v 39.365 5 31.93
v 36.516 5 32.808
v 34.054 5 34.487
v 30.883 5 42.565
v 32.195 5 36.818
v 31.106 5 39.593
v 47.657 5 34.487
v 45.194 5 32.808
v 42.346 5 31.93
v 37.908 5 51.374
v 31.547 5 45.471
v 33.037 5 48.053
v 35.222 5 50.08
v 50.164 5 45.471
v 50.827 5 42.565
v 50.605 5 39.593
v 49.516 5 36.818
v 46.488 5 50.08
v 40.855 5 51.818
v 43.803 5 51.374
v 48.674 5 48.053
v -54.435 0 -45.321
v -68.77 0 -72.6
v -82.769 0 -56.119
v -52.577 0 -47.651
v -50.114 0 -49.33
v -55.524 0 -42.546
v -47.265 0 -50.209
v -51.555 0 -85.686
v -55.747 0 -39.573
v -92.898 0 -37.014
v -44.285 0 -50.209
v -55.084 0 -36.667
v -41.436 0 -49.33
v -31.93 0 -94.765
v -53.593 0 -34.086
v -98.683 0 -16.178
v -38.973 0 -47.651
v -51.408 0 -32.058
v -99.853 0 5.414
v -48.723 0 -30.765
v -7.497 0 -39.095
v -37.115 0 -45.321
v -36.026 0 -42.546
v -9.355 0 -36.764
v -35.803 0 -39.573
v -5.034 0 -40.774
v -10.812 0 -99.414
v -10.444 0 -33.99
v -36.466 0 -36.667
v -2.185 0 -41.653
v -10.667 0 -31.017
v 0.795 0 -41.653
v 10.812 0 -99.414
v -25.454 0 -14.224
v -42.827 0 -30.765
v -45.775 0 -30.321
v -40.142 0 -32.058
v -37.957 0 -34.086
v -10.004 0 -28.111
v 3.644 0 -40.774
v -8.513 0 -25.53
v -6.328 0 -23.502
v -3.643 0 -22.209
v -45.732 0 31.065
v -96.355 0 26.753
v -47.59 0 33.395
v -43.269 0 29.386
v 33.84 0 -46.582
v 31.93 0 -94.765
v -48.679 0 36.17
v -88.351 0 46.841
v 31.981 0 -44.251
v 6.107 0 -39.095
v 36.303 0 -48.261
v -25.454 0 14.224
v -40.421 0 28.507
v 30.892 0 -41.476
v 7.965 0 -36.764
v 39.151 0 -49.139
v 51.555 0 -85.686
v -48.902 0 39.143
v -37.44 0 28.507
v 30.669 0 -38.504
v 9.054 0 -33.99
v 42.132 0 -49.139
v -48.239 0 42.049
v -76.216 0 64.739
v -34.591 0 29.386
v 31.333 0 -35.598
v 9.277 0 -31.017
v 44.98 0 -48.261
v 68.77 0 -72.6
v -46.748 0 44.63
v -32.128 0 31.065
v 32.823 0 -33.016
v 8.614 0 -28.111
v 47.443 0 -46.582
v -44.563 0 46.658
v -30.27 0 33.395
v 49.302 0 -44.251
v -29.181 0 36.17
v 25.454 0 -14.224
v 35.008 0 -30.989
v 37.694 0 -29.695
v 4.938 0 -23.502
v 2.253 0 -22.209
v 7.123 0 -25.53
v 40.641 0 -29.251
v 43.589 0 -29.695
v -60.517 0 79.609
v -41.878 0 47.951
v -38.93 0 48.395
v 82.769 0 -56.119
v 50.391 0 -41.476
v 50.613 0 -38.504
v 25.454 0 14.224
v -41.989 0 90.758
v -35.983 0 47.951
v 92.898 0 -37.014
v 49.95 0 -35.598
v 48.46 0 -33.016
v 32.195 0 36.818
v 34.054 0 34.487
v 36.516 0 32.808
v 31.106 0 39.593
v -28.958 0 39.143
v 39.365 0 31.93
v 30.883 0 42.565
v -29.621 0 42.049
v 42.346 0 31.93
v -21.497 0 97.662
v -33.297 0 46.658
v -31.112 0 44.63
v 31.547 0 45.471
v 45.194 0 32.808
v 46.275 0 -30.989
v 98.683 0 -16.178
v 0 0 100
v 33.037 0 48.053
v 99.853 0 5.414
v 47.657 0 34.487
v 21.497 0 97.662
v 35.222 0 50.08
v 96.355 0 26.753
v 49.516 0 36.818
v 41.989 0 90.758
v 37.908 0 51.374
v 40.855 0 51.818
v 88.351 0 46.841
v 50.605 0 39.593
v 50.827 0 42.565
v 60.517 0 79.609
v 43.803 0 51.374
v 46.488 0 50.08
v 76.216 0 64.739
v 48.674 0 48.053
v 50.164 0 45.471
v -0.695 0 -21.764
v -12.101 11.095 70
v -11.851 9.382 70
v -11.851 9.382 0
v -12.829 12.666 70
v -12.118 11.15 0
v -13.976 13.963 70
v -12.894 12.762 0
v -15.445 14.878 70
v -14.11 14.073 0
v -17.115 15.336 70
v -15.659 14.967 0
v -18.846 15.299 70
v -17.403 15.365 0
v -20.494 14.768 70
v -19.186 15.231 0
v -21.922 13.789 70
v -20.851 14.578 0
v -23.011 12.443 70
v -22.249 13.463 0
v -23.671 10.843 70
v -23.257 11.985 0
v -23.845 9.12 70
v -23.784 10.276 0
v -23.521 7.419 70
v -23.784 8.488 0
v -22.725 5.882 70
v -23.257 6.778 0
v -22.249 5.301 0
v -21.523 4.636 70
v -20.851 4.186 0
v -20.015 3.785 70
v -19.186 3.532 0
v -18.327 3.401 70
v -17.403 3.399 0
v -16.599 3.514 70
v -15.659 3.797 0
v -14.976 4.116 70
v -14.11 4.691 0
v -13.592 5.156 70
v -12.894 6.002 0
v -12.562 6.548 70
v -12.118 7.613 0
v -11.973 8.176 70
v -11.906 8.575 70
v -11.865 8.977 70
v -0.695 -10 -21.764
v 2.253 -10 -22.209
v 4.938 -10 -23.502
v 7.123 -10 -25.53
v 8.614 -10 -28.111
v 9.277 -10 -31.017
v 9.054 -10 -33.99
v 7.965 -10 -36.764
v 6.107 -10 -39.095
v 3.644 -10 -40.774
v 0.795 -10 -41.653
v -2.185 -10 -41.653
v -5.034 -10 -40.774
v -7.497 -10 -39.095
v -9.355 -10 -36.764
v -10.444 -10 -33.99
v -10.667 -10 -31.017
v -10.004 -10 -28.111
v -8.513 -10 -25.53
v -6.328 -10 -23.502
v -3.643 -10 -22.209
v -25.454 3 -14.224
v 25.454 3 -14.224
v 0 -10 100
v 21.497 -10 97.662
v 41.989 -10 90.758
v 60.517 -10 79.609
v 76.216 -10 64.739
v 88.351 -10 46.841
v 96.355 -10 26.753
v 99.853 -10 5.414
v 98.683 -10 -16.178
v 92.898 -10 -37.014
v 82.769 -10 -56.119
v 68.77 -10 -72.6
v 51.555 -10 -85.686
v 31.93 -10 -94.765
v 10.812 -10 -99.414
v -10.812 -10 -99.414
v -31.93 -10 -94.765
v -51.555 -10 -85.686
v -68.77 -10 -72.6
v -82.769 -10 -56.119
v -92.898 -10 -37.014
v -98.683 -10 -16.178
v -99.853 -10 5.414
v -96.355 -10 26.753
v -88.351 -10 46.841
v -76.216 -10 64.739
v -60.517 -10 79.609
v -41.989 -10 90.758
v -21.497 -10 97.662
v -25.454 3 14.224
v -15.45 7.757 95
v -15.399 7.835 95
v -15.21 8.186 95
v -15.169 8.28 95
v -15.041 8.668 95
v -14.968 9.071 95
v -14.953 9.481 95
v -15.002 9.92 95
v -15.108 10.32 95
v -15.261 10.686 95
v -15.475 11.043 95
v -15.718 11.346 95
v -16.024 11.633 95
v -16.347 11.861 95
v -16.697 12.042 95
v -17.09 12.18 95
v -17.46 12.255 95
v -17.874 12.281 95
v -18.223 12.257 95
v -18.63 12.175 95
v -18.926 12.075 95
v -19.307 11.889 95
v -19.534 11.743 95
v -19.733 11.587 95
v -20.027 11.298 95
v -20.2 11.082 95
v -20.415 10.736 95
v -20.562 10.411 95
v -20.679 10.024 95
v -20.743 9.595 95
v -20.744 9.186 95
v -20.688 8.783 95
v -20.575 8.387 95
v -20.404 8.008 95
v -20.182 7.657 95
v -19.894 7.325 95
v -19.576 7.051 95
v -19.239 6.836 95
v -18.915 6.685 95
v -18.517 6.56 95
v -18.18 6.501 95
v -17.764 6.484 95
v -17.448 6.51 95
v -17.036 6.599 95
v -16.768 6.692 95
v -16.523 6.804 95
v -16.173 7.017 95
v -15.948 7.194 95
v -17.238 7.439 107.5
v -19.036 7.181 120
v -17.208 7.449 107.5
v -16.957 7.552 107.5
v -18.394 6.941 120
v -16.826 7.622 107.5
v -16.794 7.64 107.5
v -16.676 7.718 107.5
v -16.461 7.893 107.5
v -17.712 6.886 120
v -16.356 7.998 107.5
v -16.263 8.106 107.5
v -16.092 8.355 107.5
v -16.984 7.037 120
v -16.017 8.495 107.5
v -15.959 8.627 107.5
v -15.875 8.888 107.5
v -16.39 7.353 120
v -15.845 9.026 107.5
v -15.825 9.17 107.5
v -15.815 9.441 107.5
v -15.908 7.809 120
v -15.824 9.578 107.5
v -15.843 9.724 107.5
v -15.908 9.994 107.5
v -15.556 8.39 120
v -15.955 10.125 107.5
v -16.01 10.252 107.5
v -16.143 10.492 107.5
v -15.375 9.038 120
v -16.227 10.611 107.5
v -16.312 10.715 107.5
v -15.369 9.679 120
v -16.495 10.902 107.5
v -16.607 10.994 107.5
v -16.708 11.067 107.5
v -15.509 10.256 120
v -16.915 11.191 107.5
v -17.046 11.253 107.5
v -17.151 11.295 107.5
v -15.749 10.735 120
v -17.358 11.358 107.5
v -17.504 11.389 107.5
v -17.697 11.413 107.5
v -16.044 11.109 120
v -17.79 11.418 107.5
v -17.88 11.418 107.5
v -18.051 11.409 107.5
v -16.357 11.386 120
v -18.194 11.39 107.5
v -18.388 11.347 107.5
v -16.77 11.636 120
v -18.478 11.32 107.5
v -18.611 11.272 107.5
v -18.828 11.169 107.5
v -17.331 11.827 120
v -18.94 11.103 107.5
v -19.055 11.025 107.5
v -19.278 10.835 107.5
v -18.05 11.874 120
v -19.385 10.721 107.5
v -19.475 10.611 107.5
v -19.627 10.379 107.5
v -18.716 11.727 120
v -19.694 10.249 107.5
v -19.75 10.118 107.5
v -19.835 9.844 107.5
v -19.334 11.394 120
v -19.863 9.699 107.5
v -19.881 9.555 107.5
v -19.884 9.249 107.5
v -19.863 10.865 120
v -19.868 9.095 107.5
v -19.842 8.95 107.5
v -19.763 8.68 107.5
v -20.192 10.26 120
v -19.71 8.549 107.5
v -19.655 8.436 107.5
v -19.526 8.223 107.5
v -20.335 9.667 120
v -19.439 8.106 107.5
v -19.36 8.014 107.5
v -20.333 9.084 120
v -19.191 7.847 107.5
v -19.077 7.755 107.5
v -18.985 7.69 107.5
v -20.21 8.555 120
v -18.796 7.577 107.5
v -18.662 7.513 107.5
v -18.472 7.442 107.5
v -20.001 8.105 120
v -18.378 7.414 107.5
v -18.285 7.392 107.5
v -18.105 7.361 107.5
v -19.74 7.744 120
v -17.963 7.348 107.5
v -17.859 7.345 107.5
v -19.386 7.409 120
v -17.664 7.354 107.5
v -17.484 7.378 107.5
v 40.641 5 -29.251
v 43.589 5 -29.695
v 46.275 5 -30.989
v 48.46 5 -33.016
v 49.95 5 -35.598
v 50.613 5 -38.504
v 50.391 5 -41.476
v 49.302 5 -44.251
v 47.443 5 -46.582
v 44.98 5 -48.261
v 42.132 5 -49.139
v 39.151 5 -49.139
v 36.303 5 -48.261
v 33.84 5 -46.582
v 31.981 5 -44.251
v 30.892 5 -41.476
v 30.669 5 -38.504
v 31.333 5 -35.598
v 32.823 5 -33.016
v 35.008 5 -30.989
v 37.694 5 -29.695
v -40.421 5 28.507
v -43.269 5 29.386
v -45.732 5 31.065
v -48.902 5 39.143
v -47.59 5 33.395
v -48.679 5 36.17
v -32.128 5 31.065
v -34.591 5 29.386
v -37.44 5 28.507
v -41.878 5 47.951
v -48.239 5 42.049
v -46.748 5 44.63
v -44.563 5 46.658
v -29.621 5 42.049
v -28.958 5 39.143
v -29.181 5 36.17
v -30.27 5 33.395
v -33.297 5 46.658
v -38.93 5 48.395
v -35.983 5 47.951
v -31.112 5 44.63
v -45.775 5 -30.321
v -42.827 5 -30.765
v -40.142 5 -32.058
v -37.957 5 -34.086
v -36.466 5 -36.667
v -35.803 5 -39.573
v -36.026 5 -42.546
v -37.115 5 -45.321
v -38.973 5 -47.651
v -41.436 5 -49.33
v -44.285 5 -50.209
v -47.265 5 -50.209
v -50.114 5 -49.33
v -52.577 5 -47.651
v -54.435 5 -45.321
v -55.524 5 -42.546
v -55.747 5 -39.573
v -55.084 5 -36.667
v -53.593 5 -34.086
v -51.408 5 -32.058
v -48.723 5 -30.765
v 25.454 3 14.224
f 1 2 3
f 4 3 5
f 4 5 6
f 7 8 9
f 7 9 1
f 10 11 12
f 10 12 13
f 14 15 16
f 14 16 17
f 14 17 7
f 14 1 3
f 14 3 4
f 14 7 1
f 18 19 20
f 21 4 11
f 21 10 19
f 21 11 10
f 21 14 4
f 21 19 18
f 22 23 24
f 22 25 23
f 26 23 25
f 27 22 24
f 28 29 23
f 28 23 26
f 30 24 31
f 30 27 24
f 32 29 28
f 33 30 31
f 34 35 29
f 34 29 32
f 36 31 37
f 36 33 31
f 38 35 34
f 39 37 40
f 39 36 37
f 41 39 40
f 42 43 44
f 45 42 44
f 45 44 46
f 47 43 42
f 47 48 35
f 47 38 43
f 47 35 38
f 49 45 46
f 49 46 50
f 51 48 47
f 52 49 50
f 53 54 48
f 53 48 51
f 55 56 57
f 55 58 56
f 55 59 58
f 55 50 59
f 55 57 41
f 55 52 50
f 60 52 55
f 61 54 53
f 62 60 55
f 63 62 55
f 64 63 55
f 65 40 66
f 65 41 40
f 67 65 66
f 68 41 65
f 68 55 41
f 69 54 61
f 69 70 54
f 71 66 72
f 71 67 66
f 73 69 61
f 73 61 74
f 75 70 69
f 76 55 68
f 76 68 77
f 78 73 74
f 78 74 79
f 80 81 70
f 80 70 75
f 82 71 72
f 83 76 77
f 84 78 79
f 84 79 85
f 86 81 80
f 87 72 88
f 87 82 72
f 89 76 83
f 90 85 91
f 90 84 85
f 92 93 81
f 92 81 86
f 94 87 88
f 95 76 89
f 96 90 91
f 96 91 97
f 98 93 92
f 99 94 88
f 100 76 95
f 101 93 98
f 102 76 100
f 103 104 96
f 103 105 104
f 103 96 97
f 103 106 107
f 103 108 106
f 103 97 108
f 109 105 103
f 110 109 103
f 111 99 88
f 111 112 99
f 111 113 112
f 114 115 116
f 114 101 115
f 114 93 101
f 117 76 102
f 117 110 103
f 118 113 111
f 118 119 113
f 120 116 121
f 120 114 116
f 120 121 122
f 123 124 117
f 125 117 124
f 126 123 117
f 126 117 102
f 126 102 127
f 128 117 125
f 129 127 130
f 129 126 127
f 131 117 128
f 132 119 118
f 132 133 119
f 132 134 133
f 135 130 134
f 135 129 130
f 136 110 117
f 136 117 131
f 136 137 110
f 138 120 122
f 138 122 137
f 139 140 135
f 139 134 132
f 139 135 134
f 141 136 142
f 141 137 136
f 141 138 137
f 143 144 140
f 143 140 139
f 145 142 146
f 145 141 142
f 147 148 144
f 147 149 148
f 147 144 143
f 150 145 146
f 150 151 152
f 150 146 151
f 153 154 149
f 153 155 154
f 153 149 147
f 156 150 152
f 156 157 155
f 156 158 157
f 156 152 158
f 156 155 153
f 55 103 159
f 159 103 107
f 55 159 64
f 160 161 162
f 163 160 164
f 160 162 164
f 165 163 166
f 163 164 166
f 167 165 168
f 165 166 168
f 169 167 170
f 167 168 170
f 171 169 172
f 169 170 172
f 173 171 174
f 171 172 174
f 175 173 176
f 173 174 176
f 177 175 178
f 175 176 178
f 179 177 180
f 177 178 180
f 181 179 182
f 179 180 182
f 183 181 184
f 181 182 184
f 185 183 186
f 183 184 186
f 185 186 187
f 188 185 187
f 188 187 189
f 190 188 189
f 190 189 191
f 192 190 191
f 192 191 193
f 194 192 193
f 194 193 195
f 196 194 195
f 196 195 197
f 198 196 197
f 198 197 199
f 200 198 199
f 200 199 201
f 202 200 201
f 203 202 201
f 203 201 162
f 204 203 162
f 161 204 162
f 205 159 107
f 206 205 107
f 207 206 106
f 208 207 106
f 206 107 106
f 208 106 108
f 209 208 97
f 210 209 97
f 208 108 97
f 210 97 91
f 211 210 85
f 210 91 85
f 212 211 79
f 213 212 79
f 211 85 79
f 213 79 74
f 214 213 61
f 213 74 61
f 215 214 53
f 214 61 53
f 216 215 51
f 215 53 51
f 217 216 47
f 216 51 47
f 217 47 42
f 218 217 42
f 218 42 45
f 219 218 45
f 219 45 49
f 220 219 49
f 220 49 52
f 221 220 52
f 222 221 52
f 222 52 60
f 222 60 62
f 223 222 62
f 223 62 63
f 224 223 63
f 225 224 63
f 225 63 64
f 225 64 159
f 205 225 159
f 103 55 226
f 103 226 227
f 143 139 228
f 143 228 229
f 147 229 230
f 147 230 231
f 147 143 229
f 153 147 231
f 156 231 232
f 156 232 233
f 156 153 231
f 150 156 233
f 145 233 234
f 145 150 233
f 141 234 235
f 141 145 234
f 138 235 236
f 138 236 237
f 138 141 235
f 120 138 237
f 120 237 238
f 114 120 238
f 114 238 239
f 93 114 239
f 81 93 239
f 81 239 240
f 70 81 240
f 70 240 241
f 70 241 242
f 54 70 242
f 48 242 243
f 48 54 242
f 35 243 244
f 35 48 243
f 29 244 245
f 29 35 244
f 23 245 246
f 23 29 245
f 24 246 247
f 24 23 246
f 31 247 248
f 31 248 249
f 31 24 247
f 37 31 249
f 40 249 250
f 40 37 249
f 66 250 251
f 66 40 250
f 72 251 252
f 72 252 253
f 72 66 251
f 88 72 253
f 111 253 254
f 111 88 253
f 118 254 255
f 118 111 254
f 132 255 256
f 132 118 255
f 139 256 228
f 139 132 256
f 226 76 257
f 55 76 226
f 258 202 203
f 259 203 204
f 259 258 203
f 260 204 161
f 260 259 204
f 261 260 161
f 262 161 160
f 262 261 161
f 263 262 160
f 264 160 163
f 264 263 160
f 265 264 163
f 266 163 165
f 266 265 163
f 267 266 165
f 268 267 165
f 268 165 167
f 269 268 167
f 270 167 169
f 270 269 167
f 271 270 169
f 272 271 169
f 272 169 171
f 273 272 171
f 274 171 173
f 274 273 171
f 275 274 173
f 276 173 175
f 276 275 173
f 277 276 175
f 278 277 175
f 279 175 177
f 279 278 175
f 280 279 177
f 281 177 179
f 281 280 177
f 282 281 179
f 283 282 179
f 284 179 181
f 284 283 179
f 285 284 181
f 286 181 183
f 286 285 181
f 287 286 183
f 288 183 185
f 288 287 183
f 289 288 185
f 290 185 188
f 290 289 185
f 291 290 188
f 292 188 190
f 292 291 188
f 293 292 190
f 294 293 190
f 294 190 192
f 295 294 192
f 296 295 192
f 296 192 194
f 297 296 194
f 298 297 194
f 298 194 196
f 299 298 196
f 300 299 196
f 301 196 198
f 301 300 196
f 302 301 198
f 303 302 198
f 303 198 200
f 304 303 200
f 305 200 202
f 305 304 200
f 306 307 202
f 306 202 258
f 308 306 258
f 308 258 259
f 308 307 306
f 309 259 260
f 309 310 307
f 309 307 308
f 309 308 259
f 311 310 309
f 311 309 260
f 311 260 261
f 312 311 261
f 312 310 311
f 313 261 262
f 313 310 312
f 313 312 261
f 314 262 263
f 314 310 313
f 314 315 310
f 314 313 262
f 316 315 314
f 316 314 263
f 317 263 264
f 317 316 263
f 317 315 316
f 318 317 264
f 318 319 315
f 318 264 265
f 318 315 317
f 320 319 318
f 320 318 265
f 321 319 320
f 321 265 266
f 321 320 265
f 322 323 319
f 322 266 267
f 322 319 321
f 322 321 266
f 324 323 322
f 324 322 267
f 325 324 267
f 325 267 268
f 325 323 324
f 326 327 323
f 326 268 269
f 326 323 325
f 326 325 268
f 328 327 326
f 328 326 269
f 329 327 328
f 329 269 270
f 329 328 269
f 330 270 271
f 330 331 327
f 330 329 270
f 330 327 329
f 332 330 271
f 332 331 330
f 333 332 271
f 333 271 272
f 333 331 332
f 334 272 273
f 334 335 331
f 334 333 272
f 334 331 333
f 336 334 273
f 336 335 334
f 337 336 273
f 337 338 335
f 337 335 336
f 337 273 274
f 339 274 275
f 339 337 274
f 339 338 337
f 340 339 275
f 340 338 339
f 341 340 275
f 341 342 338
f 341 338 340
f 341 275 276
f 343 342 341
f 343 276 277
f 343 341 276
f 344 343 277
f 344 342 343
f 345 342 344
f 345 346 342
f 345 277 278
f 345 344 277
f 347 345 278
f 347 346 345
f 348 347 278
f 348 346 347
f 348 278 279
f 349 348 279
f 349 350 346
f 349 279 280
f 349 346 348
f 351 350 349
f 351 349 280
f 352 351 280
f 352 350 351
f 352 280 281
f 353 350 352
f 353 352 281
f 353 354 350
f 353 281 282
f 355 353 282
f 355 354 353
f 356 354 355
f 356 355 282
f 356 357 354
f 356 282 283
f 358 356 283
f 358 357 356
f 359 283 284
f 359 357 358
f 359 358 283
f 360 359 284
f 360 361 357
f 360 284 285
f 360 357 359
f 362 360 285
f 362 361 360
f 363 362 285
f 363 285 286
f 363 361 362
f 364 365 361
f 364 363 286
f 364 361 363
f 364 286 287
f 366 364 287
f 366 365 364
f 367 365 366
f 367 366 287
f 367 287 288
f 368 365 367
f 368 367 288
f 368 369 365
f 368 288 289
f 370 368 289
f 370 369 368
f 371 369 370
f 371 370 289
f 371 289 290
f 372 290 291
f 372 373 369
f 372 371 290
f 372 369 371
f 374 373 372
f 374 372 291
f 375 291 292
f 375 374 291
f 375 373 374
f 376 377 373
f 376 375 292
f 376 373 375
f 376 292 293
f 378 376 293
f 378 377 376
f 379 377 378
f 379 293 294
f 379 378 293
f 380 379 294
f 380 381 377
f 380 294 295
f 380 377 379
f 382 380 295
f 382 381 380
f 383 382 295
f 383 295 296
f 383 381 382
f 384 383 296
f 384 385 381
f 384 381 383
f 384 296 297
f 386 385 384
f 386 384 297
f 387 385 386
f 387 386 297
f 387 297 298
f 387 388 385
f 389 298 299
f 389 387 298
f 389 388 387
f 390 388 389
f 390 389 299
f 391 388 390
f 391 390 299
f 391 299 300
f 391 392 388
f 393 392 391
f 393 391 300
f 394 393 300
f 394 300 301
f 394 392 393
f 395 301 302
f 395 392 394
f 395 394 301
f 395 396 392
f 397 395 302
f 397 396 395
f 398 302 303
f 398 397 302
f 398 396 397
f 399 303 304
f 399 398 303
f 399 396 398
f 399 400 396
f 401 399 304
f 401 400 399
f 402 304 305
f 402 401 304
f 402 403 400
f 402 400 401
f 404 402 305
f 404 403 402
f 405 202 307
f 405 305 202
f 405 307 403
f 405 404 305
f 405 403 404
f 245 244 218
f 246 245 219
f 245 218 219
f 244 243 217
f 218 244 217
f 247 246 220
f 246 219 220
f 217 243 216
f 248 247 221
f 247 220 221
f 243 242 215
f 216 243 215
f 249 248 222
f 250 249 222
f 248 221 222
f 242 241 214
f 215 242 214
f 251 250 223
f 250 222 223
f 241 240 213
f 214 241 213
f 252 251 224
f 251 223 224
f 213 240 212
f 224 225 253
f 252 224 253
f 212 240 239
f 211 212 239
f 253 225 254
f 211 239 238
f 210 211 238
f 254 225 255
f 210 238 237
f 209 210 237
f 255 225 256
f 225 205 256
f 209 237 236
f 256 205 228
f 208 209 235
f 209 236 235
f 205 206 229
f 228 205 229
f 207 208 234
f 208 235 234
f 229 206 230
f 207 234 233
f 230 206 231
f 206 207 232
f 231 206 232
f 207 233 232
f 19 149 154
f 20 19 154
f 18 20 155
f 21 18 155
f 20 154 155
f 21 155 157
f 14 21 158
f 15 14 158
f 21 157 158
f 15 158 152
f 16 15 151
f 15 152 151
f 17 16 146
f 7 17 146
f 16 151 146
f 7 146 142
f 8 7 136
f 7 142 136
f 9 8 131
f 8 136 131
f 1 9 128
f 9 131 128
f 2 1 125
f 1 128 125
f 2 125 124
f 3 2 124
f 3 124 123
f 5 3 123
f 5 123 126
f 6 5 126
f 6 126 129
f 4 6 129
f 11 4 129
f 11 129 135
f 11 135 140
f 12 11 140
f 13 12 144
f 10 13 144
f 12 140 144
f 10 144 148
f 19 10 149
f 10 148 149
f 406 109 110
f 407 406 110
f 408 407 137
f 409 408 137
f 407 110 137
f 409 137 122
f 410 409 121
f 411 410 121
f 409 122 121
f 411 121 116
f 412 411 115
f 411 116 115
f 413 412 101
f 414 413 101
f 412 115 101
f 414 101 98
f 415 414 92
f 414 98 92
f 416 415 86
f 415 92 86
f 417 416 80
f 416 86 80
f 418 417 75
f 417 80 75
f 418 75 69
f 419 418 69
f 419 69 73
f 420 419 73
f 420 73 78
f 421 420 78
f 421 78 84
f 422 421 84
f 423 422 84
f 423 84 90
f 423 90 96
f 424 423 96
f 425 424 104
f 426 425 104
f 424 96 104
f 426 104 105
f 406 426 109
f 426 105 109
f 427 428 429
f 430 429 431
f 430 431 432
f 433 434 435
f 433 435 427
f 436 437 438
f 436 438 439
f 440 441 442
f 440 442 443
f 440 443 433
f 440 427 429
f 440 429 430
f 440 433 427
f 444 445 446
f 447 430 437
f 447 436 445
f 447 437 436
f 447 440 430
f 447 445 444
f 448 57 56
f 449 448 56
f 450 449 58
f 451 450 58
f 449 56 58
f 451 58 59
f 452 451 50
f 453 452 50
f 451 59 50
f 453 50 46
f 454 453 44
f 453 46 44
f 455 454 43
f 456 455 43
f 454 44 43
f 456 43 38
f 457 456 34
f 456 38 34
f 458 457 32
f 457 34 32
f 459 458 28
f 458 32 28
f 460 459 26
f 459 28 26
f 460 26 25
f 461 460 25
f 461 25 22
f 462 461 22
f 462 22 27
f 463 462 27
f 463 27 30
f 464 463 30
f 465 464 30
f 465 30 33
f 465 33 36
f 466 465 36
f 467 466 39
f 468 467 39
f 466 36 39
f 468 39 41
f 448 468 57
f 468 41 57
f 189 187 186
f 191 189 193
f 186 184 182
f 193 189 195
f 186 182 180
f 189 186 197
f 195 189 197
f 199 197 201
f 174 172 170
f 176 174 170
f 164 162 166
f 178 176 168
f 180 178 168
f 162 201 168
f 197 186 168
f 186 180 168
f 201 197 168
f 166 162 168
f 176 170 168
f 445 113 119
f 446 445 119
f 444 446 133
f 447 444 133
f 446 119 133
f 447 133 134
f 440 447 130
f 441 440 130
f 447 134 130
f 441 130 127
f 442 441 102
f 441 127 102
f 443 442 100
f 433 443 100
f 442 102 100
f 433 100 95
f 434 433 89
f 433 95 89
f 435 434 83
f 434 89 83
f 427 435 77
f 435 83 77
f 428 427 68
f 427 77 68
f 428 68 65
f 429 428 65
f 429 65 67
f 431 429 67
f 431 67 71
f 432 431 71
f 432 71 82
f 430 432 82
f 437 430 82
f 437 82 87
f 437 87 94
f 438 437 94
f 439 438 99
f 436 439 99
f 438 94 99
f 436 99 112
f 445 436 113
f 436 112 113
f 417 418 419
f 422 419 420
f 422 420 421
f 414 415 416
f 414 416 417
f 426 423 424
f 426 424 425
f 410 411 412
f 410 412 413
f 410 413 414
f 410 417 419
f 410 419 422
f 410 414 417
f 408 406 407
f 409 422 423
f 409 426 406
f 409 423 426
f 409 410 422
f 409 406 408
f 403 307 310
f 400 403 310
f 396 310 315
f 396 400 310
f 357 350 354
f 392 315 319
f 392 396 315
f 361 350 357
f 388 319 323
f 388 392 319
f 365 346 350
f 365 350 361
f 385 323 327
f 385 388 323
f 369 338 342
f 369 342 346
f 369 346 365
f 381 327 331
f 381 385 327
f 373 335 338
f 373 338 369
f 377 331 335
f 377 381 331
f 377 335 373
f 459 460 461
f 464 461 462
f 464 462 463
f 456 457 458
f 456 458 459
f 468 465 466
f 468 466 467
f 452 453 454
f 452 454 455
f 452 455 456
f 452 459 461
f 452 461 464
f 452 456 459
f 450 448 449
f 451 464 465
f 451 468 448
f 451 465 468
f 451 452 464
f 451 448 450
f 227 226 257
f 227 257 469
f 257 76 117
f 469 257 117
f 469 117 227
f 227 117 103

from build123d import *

# Parameters (mm, degrees)
SKETCH_1_R          = 100
EXTRUDE_1_DEPTH     = 10
SKETCH_3_W          = 50.90867769
SKETCH_3_H          = 28.448966944
EXTRUDE_2_DEPTH     = 3
SKETCH_4_R          = 10
CUT_EXTRUDE_1_DEPTH = 13
SKETCH_5_R          = 10
EXTRUDE_3_DEPTH     = 5
SKETCH_6_R          = 6
EXTRUDE_5_DEPTH     = 70


with BuildPart() as part:
    # 草图1 → 凸台-拉伸1 (new body)
    with BuildSketch(Plane(origin=(0, 0, 0), x_dir=(1, 0, 0), z_dir=(0, 1, 0))):
        with Locations(Location((0, 0, 0), (0, 0, 270))):
            Circle(SKETCH_1_R)
    extrude(amount=-EXTRUDE_1_DEPTH)

    # 草图3 → 凸台-拉伸2 (add)
    with BuildSketch(Plane(origin=(0, 0, 0), x_dir=(1, 0, 0), z_dir=(0, 1, 0))):
        Rectangle(SKETCH_3_W, SKETCH_3_H)
    extrude(amount=EXTRUDE_2_DEPTH)

    # 草图4 → 切除-拉伸1 (cut)
    with BuildSketch(Plane(origin=(0, 0, 0), x_dir=(1, 0, 0), z_dir=(0, 1, 0))):
        with Locations(Location((-0.694974251, 31.764448054, 0), (0, 0, 270))):
            Circle(SKETCH_4_R)
    extrude(amount=-CUT_EXTRUDE_1_DEPTH, mode=Mode.SUBTRACT)

    # 草图5 → 凸台-拉伸3 (add)
    with BuildSketch(Plane(origin=(0, 0, 0), x_dir=(1, 0, 0), z_dir=(0, 1, 0))):
        with Locations(Location((40.855283356, -41.817842388, 0), (0, 0, 270))):
            Circle(SKETCH_5_R)
        with Locations(Location((-38.930165292, -38.395410274, 0), (0, 0, 270))):
            Circle(SKETCH_5_R)
        with Locations(Location((-45.775029519, 40.320528338, 0), (0, 0, 270))):
            Circle(SKETCH_5_R)
        with Locations(Location((40.641381349, 39.251018302, 0), (0, 0, 270))):
            Circle(SKETCH_5_R)
    extrude(amount=EXTRUDE_3_DEPTH)


with BuildPart() as body_2:
    # 草图6 → 凸台-拉伸5 (new body)
    with BuildSketch(Plane.XY):
        with Locations((-17.851094774, 9.381785608)):
            Circle(SKETCH_6_R)
    extrude(amount=EXTRUDE_5_DEPTH)

    # 放样1: read off the stored shape, not the designer's step
    # 放样1: loft between two sections, ruled curve by curve
    loft_1_from = [
        Edge.make_bspline([(-11.973474879, 8.17613874, 70), (-9.562181143, 19.93137853, 70), (-21.317420933, 22.342672266, 70), (-23.728714669, 10.587432476, 70), (-26.140008405, -1.167807313, 70), (-14.384768615, -3.57910105, 70), (-11.973474879, 8.17613874, 70)], [0, 0, 0, 0, 0.5, 0.5, 0.5, 1, 1, 1, 1], 3, [1, 0.333333333, 0.333333333, 1, 0.333333333, 0.333333333, 1]),
    ]
    loft_1_to = [
        Edge.make_bspline([(-19.036161622, 7.180509486, 120), (-14.633609377, 4.810375791, 120), (-12.263475682, 9.212928036, 120), (-16.666027927, 11.583061731, 120), (-21.068580172, 13.953195426, 120), (-23.438713866, 9.550643181, 120), (-19.036161622, 7.180509486, 120)], [0, 0, 0, 0, 0.5, 0.5, 0.5, 1, 1, 1, 1], 3, [1, 0.333333333, 0.333333333, 1, 0.333333333, 0.333333333, 1]),
    ]
    loft_1 = Solid(Shell([*[Face.make_surface_from_curves(loft_1_from[k], loft_1_to[k]) for k in range(1)], Face(Wire(loft_1_from)), Face(Wire(loft_1_to))]))
    add(loft_1)


solid = Compound([part.part, body_2.part])
